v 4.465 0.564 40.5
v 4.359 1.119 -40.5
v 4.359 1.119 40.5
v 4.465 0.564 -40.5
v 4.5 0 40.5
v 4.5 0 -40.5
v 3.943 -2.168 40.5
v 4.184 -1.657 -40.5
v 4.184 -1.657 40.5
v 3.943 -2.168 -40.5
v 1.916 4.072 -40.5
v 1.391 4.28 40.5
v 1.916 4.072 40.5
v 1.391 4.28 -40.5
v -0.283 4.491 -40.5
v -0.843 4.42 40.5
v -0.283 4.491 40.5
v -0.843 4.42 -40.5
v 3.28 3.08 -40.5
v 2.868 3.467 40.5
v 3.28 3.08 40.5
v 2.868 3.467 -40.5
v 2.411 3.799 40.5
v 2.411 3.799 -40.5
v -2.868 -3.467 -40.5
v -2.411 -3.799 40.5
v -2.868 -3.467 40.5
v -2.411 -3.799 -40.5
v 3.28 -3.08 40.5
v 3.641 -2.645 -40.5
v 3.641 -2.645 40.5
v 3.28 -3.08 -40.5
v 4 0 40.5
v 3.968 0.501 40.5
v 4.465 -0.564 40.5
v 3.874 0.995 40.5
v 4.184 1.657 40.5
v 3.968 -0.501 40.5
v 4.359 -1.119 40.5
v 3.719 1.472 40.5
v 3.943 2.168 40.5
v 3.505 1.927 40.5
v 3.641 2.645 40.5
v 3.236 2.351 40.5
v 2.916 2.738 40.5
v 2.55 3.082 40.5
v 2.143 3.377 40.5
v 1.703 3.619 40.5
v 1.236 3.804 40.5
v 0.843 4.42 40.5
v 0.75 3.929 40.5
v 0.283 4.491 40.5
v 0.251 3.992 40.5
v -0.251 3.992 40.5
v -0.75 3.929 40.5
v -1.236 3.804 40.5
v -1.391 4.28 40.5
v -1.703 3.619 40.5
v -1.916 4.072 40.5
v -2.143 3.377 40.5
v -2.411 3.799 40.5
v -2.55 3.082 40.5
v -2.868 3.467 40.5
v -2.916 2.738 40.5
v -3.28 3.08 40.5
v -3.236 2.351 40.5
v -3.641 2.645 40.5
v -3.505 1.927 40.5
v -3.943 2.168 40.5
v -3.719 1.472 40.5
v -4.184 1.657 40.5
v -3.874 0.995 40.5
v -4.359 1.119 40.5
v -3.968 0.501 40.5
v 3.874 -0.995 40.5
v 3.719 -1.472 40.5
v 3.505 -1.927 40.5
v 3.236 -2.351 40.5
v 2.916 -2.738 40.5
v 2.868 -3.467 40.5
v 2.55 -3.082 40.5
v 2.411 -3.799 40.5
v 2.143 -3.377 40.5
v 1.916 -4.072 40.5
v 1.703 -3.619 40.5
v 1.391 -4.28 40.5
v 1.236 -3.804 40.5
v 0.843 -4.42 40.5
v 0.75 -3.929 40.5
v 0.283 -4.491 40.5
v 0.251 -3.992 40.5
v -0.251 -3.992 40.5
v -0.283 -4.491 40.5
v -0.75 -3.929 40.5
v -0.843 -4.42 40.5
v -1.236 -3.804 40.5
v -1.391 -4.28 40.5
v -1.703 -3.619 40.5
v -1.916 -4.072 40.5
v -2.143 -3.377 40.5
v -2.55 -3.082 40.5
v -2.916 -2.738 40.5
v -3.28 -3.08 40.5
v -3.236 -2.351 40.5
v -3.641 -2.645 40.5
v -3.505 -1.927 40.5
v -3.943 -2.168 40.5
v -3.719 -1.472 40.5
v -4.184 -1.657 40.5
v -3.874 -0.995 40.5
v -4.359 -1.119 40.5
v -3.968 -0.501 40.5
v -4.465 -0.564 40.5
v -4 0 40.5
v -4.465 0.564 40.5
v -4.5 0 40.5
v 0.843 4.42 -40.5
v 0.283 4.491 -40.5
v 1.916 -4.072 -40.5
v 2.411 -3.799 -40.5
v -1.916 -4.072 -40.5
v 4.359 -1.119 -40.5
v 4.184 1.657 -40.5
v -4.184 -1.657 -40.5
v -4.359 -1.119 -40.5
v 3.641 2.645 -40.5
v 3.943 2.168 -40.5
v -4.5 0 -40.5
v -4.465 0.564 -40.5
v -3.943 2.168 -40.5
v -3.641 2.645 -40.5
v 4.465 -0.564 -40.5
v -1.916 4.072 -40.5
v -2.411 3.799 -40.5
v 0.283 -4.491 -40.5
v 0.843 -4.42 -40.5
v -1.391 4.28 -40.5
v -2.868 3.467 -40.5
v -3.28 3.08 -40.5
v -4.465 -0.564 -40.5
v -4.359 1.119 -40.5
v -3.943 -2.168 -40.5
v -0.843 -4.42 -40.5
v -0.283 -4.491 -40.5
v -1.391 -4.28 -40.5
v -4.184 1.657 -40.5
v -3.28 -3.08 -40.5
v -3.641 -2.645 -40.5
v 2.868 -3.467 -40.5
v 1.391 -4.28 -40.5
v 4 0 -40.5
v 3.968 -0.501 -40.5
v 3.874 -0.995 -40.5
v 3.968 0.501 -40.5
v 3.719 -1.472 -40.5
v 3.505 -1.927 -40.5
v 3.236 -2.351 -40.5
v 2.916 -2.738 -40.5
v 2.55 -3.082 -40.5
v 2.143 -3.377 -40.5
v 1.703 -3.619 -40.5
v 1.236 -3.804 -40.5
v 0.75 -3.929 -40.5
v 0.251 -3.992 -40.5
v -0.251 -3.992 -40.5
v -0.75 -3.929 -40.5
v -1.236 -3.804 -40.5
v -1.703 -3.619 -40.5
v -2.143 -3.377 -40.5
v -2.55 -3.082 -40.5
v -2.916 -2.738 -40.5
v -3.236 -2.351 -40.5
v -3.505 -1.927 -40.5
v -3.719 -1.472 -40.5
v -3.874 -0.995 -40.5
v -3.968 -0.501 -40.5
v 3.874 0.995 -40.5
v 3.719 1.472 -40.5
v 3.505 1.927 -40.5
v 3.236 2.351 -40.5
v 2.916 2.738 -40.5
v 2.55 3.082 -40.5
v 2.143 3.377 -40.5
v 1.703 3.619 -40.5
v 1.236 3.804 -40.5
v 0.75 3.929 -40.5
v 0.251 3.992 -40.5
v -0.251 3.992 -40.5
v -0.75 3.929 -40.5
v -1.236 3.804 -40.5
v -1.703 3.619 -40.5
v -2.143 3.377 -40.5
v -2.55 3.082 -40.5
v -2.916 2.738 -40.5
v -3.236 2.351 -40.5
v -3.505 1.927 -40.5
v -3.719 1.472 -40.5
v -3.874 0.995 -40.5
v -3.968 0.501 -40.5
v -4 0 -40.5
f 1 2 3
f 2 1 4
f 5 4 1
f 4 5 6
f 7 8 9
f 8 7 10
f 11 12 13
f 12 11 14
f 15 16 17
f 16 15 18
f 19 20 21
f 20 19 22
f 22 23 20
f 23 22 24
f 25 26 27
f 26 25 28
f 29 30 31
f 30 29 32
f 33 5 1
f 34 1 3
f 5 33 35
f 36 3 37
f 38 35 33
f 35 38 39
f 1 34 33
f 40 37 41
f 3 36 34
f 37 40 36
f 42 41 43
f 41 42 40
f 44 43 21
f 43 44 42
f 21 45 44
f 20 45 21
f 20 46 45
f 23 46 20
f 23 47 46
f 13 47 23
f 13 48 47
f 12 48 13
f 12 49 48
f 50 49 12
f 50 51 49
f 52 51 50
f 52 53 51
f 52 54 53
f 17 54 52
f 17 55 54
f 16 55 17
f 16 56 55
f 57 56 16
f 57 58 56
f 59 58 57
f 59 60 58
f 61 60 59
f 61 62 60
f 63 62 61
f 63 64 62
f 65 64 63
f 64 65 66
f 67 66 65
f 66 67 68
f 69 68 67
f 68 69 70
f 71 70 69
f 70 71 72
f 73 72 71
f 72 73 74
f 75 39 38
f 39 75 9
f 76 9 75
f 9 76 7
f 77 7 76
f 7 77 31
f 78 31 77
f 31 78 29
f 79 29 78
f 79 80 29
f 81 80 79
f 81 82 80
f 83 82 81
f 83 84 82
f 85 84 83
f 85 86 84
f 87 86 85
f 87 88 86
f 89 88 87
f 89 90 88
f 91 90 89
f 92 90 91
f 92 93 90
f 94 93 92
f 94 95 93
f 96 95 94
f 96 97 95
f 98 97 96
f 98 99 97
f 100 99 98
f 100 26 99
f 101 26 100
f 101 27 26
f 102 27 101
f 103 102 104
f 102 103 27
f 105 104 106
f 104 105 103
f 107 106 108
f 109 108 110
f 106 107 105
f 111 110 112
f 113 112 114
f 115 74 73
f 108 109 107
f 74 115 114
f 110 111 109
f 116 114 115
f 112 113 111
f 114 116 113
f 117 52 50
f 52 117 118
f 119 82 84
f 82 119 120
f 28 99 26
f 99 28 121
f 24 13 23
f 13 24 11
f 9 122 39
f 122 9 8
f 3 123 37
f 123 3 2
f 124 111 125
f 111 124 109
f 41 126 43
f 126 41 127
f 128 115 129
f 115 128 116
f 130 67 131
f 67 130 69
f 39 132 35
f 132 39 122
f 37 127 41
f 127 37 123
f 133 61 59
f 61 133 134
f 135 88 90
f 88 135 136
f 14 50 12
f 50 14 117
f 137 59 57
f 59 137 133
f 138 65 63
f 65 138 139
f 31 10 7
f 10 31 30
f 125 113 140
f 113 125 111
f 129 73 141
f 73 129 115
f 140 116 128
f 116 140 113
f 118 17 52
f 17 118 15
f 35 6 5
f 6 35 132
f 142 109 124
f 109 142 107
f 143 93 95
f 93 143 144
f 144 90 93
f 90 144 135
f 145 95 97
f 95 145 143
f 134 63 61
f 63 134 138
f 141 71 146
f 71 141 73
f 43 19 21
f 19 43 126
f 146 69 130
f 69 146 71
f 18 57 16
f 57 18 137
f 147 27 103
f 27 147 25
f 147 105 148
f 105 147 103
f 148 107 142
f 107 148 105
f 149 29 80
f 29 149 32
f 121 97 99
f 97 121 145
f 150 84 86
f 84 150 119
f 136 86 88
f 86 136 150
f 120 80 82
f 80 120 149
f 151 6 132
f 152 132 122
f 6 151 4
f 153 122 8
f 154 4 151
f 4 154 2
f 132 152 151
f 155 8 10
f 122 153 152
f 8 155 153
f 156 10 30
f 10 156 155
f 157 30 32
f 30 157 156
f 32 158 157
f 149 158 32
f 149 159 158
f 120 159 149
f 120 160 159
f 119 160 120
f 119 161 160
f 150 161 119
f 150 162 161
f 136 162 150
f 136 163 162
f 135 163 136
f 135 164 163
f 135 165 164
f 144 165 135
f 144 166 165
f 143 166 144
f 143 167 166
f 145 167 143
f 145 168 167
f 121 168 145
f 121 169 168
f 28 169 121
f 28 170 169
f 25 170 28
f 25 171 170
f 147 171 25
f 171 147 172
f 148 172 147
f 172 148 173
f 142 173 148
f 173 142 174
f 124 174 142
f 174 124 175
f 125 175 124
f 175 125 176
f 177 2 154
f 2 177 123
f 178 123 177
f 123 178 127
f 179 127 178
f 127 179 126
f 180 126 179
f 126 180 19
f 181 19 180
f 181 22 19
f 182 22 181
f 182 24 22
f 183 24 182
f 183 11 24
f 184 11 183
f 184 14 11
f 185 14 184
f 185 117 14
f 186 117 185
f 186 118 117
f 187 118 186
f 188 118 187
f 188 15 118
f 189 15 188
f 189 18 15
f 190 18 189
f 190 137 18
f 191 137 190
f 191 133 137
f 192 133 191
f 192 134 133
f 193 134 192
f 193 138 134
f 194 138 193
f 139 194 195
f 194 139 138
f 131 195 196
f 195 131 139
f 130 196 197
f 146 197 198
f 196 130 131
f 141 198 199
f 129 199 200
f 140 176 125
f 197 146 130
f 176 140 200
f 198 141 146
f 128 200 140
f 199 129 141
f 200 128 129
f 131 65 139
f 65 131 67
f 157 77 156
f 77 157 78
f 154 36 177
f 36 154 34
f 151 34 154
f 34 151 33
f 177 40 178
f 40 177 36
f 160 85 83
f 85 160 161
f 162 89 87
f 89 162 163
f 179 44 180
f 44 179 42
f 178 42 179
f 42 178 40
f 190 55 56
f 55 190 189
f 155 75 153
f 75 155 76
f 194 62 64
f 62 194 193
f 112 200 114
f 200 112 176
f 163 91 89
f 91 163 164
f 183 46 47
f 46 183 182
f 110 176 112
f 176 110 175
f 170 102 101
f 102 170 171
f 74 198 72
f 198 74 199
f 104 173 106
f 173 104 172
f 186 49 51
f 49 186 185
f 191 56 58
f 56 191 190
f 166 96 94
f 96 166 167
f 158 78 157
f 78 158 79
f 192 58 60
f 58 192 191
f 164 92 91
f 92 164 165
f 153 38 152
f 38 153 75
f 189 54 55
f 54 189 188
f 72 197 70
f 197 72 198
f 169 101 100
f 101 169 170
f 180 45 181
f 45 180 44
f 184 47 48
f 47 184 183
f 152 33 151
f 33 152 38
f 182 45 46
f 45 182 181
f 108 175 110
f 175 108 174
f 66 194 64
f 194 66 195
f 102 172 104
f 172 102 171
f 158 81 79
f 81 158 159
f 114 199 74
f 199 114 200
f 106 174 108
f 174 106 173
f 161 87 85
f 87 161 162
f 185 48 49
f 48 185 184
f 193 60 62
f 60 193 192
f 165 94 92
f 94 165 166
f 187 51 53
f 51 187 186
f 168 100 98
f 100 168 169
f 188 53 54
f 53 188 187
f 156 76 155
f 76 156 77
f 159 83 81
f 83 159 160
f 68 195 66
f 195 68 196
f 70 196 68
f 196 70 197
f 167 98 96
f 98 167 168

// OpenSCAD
$fn = 50;


difference() {
	union() {
		translate(v = [0, 0, -40.5000000000]) {
			cylinder(h = 81, r = 4.5000000000);
		}
	}
	union() {
		translate(v = [0, 0, -100.0000000000]) {
			cylinder(h = 200, r = 4.0000000000);
		}
	}
}
